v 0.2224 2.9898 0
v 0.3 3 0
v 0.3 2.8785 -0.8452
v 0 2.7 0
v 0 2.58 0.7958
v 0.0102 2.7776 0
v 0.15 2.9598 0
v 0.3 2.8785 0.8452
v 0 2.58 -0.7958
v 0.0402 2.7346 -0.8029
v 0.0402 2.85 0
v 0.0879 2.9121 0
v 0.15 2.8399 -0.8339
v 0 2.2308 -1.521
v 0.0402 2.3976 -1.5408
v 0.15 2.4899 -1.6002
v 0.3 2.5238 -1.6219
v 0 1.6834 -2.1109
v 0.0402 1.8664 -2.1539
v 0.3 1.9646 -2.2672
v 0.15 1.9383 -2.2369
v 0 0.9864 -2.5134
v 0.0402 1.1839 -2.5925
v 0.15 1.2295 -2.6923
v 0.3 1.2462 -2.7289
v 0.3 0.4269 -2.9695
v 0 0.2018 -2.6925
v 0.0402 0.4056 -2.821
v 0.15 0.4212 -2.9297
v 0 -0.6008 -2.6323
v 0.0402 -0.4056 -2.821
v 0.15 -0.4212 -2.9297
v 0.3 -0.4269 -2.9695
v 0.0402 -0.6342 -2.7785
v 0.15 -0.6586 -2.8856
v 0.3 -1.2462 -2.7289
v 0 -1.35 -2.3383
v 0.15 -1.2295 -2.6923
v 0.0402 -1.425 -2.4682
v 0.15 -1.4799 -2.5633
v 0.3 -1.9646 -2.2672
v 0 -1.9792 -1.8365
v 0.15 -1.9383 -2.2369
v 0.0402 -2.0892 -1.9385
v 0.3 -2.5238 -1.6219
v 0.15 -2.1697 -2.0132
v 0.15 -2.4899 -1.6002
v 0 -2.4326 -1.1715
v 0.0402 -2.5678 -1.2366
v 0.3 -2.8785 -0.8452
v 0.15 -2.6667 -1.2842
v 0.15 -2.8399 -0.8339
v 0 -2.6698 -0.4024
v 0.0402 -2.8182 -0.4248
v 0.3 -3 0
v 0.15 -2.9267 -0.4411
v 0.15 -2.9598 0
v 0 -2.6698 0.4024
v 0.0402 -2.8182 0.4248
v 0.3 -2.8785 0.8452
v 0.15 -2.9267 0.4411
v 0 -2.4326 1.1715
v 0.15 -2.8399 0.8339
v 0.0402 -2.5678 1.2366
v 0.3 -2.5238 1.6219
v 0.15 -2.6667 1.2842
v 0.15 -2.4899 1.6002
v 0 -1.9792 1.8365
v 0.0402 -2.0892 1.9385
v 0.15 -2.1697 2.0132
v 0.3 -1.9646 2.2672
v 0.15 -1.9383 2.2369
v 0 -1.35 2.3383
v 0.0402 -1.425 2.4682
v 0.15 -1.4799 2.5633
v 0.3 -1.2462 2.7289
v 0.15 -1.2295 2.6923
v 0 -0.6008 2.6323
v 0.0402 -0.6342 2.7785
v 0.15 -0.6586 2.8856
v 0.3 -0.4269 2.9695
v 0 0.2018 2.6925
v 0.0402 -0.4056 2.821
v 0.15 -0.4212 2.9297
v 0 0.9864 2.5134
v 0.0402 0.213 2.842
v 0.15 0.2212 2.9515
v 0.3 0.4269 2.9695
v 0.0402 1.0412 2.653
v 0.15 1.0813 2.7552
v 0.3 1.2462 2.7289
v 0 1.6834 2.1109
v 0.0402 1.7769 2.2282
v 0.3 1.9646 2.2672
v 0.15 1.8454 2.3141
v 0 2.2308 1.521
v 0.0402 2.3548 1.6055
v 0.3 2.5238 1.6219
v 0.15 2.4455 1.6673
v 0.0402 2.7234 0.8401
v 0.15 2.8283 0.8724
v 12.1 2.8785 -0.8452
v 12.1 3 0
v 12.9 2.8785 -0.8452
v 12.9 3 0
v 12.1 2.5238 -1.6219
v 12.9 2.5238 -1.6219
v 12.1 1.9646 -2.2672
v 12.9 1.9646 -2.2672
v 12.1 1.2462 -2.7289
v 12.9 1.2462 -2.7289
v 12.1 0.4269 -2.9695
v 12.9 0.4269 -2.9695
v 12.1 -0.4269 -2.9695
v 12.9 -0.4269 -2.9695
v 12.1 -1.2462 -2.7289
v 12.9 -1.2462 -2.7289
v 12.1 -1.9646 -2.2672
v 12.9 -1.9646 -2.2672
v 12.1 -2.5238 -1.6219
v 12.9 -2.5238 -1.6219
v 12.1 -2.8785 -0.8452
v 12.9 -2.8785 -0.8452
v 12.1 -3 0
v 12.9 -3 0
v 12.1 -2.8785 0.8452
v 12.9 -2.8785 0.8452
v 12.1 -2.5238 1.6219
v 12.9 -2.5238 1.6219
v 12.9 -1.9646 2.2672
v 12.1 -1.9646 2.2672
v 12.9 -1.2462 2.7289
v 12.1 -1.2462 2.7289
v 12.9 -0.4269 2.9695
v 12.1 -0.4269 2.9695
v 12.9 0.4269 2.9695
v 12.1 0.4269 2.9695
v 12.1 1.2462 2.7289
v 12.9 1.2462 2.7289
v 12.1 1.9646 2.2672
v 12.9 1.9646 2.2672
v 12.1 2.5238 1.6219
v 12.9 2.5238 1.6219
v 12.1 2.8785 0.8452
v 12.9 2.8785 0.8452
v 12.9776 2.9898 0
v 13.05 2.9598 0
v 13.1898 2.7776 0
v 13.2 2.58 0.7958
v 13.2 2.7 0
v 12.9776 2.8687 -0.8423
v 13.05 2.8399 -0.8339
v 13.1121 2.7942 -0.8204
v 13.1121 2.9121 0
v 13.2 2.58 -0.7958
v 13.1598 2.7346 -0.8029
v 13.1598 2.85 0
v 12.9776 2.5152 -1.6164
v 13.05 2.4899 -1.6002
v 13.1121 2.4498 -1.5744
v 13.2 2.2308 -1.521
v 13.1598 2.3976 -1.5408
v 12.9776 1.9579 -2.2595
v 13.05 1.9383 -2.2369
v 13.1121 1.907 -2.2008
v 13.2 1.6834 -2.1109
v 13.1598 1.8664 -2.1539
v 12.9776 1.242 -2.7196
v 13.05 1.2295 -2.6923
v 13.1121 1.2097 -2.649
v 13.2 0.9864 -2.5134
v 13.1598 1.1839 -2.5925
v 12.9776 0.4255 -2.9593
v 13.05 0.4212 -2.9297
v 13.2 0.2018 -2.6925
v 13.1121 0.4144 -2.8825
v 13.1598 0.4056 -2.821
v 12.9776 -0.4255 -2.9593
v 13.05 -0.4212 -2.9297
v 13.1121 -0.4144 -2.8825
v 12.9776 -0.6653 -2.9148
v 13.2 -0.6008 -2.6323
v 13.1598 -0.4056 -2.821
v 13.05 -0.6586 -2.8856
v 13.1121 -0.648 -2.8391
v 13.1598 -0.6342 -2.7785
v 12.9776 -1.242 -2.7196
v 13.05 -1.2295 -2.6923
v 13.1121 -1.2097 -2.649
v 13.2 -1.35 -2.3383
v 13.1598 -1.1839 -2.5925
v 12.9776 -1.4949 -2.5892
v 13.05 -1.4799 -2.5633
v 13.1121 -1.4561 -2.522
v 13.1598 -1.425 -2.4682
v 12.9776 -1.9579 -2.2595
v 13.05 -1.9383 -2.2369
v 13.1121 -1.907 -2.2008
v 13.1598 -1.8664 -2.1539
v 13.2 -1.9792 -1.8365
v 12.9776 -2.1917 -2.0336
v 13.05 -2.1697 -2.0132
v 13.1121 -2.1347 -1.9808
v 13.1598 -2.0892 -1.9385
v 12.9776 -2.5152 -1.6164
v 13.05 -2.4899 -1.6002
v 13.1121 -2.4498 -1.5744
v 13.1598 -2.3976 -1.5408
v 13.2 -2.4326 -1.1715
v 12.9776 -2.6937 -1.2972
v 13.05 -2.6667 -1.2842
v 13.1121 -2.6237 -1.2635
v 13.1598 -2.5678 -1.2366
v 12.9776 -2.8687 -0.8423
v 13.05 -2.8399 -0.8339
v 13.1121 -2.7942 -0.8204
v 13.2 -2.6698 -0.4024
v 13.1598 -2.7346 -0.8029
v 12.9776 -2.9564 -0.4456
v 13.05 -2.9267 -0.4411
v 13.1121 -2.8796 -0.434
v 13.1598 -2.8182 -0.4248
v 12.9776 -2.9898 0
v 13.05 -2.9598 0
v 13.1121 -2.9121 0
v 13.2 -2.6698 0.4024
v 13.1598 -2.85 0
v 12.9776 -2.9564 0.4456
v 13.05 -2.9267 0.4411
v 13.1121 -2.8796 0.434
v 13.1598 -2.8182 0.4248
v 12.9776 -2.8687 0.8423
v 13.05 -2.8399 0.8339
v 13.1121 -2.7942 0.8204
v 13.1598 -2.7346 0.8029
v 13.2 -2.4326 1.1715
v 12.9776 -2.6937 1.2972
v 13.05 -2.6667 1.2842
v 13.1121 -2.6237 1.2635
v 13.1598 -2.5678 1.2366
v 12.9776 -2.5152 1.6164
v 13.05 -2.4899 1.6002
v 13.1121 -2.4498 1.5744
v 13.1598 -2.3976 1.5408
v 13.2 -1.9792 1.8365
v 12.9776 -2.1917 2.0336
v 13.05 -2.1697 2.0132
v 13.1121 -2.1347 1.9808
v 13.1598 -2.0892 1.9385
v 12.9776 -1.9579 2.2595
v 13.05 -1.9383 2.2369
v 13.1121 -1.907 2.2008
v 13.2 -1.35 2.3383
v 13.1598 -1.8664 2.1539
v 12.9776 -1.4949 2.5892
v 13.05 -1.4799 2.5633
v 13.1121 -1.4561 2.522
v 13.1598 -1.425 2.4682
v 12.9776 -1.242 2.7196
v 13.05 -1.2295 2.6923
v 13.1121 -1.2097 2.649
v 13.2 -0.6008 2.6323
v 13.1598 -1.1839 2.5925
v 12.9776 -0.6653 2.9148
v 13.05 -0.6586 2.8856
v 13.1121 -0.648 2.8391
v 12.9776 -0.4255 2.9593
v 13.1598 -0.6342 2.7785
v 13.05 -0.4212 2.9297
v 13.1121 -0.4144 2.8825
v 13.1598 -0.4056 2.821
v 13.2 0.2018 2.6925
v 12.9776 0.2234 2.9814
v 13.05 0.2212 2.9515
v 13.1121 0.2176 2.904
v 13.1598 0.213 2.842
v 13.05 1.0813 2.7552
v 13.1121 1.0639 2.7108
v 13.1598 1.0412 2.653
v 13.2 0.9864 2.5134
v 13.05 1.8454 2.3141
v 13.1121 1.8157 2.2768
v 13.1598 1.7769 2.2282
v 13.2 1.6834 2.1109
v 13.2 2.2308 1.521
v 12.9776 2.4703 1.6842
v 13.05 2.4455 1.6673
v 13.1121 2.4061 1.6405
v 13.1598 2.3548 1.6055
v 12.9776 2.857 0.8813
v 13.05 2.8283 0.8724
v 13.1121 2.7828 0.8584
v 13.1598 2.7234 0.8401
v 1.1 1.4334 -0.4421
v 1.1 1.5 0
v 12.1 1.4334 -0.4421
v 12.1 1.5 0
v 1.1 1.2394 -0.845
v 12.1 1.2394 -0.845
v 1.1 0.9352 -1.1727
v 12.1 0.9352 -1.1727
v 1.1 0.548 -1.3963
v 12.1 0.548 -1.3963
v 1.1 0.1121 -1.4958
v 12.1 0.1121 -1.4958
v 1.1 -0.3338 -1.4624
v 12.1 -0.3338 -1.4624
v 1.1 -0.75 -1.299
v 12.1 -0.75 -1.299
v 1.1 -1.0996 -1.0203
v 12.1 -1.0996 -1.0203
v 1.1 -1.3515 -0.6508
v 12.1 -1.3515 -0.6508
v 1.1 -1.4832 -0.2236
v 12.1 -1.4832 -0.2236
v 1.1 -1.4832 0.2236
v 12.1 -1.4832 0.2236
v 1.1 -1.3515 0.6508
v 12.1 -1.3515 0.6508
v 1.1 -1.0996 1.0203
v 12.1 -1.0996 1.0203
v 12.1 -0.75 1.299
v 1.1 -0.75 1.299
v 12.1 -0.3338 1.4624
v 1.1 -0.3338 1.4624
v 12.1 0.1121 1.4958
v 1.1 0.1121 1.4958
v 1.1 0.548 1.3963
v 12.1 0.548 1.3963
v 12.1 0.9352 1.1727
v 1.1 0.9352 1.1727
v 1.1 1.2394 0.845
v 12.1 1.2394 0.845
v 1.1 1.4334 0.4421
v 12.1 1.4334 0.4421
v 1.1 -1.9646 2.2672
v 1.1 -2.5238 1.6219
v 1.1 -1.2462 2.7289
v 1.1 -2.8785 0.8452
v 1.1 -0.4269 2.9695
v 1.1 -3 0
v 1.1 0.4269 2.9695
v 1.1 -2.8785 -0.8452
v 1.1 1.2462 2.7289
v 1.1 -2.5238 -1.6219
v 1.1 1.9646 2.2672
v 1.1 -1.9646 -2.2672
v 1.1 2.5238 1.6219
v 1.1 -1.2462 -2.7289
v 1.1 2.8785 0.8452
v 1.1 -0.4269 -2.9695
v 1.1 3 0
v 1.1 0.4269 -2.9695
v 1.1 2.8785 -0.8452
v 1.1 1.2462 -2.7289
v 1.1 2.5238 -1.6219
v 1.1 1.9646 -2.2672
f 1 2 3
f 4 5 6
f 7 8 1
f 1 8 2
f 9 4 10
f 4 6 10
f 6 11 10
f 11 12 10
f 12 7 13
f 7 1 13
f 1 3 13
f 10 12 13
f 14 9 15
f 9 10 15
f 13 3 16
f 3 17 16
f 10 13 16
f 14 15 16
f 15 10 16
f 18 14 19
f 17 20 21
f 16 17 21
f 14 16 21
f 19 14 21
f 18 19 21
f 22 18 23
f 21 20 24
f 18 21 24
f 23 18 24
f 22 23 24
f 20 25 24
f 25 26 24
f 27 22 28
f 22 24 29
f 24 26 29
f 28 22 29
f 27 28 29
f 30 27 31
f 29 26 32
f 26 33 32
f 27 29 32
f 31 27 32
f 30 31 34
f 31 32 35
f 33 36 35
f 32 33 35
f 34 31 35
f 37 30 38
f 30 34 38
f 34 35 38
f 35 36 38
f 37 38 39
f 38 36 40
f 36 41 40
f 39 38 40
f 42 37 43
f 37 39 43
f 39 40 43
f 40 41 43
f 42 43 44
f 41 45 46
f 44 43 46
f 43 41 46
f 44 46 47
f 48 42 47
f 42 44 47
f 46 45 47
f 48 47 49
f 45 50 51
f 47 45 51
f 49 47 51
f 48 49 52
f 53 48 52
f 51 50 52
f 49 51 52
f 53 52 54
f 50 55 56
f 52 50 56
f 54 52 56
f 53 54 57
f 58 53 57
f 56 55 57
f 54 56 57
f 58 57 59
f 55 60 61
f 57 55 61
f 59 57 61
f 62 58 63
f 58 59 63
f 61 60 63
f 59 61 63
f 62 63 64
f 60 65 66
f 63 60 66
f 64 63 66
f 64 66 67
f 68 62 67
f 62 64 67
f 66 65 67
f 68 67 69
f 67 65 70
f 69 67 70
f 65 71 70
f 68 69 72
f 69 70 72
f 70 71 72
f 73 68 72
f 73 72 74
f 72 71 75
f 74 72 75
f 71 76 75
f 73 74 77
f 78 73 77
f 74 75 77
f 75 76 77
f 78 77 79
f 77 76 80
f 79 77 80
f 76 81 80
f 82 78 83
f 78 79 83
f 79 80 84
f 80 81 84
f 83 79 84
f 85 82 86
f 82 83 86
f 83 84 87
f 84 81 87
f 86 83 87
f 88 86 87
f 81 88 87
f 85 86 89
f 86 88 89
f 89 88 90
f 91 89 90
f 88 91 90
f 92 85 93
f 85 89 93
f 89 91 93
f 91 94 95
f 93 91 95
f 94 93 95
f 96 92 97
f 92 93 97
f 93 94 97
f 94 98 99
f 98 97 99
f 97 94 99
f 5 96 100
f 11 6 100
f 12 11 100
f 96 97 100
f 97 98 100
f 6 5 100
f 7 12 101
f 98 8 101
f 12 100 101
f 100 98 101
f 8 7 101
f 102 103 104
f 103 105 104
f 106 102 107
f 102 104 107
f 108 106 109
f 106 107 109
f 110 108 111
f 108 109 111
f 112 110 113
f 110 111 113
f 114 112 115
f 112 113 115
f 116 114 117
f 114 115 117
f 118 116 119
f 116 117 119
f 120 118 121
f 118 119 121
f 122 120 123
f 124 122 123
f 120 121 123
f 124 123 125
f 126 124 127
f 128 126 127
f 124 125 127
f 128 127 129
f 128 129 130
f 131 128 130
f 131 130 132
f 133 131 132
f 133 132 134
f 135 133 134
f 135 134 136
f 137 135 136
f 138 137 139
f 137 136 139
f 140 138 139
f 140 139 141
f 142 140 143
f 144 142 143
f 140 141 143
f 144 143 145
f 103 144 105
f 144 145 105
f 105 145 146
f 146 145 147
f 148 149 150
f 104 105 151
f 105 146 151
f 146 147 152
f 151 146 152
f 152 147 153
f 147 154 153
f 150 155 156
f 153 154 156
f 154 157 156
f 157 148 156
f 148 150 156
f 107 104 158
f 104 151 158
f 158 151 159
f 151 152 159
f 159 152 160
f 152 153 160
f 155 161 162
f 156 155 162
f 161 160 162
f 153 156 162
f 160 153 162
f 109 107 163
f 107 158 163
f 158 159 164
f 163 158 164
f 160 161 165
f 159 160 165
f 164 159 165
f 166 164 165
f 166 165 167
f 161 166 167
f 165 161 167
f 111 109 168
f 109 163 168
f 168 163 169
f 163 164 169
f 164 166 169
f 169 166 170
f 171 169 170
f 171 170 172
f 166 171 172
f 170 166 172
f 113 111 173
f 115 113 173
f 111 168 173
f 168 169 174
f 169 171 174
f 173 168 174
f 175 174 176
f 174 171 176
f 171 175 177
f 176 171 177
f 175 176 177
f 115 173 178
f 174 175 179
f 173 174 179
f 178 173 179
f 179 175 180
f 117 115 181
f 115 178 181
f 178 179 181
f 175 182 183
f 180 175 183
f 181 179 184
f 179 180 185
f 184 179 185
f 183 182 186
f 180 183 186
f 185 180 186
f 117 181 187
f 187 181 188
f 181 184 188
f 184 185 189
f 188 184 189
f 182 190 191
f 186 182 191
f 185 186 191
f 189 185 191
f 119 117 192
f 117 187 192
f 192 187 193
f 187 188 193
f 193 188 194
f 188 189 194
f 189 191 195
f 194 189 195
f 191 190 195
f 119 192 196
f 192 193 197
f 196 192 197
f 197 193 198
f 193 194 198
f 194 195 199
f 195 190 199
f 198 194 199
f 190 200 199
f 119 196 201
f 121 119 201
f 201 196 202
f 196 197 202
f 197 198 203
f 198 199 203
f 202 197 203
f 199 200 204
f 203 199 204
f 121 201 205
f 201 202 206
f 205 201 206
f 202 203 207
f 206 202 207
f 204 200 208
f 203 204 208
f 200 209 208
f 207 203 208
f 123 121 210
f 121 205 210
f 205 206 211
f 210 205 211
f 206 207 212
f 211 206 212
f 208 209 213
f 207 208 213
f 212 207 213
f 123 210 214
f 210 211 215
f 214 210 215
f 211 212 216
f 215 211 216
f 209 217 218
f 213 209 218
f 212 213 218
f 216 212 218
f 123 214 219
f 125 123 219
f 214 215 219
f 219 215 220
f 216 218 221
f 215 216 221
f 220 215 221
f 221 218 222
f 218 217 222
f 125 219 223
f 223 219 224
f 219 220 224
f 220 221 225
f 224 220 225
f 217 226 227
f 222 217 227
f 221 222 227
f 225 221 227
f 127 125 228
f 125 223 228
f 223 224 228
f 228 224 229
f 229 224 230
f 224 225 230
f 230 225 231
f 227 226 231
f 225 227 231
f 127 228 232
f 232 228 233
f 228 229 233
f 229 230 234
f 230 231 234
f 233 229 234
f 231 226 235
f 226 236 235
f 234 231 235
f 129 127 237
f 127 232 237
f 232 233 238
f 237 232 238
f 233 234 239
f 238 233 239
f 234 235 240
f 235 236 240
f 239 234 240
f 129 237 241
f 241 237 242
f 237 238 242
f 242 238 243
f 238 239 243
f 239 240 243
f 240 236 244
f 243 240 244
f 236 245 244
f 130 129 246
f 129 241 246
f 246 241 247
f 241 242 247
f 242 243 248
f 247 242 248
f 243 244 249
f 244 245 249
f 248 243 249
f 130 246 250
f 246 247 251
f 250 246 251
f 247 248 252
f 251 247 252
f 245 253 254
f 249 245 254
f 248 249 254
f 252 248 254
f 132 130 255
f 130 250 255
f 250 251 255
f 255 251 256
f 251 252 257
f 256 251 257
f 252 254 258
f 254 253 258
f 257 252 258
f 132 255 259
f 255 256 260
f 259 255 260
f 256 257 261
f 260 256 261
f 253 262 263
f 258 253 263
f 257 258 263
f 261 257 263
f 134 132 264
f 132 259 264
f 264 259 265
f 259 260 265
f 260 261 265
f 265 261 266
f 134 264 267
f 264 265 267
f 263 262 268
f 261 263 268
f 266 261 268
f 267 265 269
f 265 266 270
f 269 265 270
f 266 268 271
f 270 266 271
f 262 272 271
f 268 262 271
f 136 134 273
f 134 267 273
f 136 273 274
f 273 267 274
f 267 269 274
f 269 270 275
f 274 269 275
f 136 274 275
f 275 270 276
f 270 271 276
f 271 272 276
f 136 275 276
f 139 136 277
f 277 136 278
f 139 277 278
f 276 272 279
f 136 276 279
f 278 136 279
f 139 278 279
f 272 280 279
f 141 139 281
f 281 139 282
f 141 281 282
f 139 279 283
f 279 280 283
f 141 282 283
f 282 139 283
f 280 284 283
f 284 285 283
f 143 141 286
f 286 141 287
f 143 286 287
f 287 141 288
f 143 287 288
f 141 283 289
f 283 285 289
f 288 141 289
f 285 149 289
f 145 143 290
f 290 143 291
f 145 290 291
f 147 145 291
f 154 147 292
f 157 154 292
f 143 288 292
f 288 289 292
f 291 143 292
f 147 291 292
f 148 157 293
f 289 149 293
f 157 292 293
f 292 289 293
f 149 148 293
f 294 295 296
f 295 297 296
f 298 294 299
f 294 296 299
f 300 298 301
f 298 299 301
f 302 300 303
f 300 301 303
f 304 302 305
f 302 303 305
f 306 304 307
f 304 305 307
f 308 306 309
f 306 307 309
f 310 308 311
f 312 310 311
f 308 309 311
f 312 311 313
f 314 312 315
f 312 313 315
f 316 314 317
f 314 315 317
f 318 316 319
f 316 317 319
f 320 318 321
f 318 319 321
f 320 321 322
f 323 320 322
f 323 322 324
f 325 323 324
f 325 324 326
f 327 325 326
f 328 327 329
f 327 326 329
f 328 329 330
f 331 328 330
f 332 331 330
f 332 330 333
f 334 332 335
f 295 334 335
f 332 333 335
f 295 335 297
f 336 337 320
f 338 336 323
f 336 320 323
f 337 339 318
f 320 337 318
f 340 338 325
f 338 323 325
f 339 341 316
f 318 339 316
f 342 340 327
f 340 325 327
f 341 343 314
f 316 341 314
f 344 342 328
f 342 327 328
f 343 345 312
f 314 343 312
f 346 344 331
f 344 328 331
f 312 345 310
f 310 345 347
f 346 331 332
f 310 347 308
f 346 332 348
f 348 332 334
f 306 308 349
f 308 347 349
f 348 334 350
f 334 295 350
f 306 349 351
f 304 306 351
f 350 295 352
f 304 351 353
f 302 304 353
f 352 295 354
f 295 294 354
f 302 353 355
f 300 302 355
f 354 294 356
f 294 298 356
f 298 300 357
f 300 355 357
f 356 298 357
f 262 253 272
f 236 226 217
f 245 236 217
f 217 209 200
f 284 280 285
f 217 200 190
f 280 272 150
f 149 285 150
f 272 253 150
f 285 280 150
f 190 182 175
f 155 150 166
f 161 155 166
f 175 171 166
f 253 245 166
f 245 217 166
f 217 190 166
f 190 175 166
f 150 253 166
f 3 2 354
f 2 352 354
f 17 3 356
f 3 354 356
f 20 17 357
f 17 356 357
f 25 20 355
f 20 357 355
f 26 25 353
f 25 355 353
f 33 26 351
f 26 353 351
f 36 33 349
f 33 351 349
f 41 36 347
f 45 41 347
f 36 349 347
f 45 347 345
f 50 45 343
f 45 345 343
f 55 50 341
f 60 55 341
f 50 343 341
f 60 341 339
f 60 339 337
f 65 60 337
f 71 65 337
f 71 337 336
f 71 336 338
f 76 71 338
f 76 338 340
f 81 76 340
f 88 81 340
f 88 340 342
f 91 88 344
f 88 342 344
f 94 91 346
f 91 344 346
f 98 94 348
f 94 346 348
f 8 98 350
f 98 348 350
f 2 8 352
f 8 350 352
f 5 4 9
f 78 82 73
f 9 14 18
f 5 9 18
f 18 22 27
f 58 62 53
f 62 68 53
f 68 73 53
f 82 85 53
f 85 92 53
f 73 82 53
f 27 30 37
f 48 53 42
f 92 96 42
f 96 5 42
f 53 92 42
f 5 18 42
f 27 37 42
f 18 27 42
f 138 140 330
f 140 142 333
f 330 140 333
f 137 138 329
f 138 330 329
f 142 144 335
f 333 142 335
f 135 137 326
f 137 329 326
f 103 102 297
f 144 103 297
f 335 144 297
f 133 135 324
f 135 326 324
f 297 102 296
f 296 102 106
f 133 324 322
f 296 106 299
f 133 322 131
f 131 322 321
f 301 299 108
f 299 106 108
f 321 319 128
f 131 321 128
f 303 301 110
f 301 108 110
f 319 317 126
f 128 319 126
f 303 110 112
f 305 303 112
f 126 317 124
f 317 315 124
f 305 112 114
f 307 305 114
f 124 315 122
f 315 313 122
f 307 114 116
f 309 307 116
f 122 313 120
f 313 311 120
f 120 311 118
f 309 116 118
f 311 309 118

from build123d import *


with BuildPart() as part:
    # 草图1 → 旋转1 (revolve)
    with BuildSketch(Plane.XY):
        with BuildLine():
            Line((0, 0), (0, 2.7))
            ThreePointArc((0, 2.7), (0.087867966, 2.912132034), (0.3, 3))
            Line((0.3, 3), (1.1, 3))
            Line((1.1, 3), (1.1, 1.5))
            Line((1.1, 1.5), (12.1, 1.5))
            Line((12.1, 1.5), (12.1, 3))
            Line((12.1, 3), (12.9, 3))
            ThreePointArc((12.9, 3), (13.112132034, 2.912132034), (13.2, 2.7))
            Line((13.2, 2.7), (13.2, 0))
            Line((13.2, 0), (0, 0))
        make_face()
    revolve(axis=Axis((13.2, 0, 0), (-1, 0, 0)))


solid = part.part
